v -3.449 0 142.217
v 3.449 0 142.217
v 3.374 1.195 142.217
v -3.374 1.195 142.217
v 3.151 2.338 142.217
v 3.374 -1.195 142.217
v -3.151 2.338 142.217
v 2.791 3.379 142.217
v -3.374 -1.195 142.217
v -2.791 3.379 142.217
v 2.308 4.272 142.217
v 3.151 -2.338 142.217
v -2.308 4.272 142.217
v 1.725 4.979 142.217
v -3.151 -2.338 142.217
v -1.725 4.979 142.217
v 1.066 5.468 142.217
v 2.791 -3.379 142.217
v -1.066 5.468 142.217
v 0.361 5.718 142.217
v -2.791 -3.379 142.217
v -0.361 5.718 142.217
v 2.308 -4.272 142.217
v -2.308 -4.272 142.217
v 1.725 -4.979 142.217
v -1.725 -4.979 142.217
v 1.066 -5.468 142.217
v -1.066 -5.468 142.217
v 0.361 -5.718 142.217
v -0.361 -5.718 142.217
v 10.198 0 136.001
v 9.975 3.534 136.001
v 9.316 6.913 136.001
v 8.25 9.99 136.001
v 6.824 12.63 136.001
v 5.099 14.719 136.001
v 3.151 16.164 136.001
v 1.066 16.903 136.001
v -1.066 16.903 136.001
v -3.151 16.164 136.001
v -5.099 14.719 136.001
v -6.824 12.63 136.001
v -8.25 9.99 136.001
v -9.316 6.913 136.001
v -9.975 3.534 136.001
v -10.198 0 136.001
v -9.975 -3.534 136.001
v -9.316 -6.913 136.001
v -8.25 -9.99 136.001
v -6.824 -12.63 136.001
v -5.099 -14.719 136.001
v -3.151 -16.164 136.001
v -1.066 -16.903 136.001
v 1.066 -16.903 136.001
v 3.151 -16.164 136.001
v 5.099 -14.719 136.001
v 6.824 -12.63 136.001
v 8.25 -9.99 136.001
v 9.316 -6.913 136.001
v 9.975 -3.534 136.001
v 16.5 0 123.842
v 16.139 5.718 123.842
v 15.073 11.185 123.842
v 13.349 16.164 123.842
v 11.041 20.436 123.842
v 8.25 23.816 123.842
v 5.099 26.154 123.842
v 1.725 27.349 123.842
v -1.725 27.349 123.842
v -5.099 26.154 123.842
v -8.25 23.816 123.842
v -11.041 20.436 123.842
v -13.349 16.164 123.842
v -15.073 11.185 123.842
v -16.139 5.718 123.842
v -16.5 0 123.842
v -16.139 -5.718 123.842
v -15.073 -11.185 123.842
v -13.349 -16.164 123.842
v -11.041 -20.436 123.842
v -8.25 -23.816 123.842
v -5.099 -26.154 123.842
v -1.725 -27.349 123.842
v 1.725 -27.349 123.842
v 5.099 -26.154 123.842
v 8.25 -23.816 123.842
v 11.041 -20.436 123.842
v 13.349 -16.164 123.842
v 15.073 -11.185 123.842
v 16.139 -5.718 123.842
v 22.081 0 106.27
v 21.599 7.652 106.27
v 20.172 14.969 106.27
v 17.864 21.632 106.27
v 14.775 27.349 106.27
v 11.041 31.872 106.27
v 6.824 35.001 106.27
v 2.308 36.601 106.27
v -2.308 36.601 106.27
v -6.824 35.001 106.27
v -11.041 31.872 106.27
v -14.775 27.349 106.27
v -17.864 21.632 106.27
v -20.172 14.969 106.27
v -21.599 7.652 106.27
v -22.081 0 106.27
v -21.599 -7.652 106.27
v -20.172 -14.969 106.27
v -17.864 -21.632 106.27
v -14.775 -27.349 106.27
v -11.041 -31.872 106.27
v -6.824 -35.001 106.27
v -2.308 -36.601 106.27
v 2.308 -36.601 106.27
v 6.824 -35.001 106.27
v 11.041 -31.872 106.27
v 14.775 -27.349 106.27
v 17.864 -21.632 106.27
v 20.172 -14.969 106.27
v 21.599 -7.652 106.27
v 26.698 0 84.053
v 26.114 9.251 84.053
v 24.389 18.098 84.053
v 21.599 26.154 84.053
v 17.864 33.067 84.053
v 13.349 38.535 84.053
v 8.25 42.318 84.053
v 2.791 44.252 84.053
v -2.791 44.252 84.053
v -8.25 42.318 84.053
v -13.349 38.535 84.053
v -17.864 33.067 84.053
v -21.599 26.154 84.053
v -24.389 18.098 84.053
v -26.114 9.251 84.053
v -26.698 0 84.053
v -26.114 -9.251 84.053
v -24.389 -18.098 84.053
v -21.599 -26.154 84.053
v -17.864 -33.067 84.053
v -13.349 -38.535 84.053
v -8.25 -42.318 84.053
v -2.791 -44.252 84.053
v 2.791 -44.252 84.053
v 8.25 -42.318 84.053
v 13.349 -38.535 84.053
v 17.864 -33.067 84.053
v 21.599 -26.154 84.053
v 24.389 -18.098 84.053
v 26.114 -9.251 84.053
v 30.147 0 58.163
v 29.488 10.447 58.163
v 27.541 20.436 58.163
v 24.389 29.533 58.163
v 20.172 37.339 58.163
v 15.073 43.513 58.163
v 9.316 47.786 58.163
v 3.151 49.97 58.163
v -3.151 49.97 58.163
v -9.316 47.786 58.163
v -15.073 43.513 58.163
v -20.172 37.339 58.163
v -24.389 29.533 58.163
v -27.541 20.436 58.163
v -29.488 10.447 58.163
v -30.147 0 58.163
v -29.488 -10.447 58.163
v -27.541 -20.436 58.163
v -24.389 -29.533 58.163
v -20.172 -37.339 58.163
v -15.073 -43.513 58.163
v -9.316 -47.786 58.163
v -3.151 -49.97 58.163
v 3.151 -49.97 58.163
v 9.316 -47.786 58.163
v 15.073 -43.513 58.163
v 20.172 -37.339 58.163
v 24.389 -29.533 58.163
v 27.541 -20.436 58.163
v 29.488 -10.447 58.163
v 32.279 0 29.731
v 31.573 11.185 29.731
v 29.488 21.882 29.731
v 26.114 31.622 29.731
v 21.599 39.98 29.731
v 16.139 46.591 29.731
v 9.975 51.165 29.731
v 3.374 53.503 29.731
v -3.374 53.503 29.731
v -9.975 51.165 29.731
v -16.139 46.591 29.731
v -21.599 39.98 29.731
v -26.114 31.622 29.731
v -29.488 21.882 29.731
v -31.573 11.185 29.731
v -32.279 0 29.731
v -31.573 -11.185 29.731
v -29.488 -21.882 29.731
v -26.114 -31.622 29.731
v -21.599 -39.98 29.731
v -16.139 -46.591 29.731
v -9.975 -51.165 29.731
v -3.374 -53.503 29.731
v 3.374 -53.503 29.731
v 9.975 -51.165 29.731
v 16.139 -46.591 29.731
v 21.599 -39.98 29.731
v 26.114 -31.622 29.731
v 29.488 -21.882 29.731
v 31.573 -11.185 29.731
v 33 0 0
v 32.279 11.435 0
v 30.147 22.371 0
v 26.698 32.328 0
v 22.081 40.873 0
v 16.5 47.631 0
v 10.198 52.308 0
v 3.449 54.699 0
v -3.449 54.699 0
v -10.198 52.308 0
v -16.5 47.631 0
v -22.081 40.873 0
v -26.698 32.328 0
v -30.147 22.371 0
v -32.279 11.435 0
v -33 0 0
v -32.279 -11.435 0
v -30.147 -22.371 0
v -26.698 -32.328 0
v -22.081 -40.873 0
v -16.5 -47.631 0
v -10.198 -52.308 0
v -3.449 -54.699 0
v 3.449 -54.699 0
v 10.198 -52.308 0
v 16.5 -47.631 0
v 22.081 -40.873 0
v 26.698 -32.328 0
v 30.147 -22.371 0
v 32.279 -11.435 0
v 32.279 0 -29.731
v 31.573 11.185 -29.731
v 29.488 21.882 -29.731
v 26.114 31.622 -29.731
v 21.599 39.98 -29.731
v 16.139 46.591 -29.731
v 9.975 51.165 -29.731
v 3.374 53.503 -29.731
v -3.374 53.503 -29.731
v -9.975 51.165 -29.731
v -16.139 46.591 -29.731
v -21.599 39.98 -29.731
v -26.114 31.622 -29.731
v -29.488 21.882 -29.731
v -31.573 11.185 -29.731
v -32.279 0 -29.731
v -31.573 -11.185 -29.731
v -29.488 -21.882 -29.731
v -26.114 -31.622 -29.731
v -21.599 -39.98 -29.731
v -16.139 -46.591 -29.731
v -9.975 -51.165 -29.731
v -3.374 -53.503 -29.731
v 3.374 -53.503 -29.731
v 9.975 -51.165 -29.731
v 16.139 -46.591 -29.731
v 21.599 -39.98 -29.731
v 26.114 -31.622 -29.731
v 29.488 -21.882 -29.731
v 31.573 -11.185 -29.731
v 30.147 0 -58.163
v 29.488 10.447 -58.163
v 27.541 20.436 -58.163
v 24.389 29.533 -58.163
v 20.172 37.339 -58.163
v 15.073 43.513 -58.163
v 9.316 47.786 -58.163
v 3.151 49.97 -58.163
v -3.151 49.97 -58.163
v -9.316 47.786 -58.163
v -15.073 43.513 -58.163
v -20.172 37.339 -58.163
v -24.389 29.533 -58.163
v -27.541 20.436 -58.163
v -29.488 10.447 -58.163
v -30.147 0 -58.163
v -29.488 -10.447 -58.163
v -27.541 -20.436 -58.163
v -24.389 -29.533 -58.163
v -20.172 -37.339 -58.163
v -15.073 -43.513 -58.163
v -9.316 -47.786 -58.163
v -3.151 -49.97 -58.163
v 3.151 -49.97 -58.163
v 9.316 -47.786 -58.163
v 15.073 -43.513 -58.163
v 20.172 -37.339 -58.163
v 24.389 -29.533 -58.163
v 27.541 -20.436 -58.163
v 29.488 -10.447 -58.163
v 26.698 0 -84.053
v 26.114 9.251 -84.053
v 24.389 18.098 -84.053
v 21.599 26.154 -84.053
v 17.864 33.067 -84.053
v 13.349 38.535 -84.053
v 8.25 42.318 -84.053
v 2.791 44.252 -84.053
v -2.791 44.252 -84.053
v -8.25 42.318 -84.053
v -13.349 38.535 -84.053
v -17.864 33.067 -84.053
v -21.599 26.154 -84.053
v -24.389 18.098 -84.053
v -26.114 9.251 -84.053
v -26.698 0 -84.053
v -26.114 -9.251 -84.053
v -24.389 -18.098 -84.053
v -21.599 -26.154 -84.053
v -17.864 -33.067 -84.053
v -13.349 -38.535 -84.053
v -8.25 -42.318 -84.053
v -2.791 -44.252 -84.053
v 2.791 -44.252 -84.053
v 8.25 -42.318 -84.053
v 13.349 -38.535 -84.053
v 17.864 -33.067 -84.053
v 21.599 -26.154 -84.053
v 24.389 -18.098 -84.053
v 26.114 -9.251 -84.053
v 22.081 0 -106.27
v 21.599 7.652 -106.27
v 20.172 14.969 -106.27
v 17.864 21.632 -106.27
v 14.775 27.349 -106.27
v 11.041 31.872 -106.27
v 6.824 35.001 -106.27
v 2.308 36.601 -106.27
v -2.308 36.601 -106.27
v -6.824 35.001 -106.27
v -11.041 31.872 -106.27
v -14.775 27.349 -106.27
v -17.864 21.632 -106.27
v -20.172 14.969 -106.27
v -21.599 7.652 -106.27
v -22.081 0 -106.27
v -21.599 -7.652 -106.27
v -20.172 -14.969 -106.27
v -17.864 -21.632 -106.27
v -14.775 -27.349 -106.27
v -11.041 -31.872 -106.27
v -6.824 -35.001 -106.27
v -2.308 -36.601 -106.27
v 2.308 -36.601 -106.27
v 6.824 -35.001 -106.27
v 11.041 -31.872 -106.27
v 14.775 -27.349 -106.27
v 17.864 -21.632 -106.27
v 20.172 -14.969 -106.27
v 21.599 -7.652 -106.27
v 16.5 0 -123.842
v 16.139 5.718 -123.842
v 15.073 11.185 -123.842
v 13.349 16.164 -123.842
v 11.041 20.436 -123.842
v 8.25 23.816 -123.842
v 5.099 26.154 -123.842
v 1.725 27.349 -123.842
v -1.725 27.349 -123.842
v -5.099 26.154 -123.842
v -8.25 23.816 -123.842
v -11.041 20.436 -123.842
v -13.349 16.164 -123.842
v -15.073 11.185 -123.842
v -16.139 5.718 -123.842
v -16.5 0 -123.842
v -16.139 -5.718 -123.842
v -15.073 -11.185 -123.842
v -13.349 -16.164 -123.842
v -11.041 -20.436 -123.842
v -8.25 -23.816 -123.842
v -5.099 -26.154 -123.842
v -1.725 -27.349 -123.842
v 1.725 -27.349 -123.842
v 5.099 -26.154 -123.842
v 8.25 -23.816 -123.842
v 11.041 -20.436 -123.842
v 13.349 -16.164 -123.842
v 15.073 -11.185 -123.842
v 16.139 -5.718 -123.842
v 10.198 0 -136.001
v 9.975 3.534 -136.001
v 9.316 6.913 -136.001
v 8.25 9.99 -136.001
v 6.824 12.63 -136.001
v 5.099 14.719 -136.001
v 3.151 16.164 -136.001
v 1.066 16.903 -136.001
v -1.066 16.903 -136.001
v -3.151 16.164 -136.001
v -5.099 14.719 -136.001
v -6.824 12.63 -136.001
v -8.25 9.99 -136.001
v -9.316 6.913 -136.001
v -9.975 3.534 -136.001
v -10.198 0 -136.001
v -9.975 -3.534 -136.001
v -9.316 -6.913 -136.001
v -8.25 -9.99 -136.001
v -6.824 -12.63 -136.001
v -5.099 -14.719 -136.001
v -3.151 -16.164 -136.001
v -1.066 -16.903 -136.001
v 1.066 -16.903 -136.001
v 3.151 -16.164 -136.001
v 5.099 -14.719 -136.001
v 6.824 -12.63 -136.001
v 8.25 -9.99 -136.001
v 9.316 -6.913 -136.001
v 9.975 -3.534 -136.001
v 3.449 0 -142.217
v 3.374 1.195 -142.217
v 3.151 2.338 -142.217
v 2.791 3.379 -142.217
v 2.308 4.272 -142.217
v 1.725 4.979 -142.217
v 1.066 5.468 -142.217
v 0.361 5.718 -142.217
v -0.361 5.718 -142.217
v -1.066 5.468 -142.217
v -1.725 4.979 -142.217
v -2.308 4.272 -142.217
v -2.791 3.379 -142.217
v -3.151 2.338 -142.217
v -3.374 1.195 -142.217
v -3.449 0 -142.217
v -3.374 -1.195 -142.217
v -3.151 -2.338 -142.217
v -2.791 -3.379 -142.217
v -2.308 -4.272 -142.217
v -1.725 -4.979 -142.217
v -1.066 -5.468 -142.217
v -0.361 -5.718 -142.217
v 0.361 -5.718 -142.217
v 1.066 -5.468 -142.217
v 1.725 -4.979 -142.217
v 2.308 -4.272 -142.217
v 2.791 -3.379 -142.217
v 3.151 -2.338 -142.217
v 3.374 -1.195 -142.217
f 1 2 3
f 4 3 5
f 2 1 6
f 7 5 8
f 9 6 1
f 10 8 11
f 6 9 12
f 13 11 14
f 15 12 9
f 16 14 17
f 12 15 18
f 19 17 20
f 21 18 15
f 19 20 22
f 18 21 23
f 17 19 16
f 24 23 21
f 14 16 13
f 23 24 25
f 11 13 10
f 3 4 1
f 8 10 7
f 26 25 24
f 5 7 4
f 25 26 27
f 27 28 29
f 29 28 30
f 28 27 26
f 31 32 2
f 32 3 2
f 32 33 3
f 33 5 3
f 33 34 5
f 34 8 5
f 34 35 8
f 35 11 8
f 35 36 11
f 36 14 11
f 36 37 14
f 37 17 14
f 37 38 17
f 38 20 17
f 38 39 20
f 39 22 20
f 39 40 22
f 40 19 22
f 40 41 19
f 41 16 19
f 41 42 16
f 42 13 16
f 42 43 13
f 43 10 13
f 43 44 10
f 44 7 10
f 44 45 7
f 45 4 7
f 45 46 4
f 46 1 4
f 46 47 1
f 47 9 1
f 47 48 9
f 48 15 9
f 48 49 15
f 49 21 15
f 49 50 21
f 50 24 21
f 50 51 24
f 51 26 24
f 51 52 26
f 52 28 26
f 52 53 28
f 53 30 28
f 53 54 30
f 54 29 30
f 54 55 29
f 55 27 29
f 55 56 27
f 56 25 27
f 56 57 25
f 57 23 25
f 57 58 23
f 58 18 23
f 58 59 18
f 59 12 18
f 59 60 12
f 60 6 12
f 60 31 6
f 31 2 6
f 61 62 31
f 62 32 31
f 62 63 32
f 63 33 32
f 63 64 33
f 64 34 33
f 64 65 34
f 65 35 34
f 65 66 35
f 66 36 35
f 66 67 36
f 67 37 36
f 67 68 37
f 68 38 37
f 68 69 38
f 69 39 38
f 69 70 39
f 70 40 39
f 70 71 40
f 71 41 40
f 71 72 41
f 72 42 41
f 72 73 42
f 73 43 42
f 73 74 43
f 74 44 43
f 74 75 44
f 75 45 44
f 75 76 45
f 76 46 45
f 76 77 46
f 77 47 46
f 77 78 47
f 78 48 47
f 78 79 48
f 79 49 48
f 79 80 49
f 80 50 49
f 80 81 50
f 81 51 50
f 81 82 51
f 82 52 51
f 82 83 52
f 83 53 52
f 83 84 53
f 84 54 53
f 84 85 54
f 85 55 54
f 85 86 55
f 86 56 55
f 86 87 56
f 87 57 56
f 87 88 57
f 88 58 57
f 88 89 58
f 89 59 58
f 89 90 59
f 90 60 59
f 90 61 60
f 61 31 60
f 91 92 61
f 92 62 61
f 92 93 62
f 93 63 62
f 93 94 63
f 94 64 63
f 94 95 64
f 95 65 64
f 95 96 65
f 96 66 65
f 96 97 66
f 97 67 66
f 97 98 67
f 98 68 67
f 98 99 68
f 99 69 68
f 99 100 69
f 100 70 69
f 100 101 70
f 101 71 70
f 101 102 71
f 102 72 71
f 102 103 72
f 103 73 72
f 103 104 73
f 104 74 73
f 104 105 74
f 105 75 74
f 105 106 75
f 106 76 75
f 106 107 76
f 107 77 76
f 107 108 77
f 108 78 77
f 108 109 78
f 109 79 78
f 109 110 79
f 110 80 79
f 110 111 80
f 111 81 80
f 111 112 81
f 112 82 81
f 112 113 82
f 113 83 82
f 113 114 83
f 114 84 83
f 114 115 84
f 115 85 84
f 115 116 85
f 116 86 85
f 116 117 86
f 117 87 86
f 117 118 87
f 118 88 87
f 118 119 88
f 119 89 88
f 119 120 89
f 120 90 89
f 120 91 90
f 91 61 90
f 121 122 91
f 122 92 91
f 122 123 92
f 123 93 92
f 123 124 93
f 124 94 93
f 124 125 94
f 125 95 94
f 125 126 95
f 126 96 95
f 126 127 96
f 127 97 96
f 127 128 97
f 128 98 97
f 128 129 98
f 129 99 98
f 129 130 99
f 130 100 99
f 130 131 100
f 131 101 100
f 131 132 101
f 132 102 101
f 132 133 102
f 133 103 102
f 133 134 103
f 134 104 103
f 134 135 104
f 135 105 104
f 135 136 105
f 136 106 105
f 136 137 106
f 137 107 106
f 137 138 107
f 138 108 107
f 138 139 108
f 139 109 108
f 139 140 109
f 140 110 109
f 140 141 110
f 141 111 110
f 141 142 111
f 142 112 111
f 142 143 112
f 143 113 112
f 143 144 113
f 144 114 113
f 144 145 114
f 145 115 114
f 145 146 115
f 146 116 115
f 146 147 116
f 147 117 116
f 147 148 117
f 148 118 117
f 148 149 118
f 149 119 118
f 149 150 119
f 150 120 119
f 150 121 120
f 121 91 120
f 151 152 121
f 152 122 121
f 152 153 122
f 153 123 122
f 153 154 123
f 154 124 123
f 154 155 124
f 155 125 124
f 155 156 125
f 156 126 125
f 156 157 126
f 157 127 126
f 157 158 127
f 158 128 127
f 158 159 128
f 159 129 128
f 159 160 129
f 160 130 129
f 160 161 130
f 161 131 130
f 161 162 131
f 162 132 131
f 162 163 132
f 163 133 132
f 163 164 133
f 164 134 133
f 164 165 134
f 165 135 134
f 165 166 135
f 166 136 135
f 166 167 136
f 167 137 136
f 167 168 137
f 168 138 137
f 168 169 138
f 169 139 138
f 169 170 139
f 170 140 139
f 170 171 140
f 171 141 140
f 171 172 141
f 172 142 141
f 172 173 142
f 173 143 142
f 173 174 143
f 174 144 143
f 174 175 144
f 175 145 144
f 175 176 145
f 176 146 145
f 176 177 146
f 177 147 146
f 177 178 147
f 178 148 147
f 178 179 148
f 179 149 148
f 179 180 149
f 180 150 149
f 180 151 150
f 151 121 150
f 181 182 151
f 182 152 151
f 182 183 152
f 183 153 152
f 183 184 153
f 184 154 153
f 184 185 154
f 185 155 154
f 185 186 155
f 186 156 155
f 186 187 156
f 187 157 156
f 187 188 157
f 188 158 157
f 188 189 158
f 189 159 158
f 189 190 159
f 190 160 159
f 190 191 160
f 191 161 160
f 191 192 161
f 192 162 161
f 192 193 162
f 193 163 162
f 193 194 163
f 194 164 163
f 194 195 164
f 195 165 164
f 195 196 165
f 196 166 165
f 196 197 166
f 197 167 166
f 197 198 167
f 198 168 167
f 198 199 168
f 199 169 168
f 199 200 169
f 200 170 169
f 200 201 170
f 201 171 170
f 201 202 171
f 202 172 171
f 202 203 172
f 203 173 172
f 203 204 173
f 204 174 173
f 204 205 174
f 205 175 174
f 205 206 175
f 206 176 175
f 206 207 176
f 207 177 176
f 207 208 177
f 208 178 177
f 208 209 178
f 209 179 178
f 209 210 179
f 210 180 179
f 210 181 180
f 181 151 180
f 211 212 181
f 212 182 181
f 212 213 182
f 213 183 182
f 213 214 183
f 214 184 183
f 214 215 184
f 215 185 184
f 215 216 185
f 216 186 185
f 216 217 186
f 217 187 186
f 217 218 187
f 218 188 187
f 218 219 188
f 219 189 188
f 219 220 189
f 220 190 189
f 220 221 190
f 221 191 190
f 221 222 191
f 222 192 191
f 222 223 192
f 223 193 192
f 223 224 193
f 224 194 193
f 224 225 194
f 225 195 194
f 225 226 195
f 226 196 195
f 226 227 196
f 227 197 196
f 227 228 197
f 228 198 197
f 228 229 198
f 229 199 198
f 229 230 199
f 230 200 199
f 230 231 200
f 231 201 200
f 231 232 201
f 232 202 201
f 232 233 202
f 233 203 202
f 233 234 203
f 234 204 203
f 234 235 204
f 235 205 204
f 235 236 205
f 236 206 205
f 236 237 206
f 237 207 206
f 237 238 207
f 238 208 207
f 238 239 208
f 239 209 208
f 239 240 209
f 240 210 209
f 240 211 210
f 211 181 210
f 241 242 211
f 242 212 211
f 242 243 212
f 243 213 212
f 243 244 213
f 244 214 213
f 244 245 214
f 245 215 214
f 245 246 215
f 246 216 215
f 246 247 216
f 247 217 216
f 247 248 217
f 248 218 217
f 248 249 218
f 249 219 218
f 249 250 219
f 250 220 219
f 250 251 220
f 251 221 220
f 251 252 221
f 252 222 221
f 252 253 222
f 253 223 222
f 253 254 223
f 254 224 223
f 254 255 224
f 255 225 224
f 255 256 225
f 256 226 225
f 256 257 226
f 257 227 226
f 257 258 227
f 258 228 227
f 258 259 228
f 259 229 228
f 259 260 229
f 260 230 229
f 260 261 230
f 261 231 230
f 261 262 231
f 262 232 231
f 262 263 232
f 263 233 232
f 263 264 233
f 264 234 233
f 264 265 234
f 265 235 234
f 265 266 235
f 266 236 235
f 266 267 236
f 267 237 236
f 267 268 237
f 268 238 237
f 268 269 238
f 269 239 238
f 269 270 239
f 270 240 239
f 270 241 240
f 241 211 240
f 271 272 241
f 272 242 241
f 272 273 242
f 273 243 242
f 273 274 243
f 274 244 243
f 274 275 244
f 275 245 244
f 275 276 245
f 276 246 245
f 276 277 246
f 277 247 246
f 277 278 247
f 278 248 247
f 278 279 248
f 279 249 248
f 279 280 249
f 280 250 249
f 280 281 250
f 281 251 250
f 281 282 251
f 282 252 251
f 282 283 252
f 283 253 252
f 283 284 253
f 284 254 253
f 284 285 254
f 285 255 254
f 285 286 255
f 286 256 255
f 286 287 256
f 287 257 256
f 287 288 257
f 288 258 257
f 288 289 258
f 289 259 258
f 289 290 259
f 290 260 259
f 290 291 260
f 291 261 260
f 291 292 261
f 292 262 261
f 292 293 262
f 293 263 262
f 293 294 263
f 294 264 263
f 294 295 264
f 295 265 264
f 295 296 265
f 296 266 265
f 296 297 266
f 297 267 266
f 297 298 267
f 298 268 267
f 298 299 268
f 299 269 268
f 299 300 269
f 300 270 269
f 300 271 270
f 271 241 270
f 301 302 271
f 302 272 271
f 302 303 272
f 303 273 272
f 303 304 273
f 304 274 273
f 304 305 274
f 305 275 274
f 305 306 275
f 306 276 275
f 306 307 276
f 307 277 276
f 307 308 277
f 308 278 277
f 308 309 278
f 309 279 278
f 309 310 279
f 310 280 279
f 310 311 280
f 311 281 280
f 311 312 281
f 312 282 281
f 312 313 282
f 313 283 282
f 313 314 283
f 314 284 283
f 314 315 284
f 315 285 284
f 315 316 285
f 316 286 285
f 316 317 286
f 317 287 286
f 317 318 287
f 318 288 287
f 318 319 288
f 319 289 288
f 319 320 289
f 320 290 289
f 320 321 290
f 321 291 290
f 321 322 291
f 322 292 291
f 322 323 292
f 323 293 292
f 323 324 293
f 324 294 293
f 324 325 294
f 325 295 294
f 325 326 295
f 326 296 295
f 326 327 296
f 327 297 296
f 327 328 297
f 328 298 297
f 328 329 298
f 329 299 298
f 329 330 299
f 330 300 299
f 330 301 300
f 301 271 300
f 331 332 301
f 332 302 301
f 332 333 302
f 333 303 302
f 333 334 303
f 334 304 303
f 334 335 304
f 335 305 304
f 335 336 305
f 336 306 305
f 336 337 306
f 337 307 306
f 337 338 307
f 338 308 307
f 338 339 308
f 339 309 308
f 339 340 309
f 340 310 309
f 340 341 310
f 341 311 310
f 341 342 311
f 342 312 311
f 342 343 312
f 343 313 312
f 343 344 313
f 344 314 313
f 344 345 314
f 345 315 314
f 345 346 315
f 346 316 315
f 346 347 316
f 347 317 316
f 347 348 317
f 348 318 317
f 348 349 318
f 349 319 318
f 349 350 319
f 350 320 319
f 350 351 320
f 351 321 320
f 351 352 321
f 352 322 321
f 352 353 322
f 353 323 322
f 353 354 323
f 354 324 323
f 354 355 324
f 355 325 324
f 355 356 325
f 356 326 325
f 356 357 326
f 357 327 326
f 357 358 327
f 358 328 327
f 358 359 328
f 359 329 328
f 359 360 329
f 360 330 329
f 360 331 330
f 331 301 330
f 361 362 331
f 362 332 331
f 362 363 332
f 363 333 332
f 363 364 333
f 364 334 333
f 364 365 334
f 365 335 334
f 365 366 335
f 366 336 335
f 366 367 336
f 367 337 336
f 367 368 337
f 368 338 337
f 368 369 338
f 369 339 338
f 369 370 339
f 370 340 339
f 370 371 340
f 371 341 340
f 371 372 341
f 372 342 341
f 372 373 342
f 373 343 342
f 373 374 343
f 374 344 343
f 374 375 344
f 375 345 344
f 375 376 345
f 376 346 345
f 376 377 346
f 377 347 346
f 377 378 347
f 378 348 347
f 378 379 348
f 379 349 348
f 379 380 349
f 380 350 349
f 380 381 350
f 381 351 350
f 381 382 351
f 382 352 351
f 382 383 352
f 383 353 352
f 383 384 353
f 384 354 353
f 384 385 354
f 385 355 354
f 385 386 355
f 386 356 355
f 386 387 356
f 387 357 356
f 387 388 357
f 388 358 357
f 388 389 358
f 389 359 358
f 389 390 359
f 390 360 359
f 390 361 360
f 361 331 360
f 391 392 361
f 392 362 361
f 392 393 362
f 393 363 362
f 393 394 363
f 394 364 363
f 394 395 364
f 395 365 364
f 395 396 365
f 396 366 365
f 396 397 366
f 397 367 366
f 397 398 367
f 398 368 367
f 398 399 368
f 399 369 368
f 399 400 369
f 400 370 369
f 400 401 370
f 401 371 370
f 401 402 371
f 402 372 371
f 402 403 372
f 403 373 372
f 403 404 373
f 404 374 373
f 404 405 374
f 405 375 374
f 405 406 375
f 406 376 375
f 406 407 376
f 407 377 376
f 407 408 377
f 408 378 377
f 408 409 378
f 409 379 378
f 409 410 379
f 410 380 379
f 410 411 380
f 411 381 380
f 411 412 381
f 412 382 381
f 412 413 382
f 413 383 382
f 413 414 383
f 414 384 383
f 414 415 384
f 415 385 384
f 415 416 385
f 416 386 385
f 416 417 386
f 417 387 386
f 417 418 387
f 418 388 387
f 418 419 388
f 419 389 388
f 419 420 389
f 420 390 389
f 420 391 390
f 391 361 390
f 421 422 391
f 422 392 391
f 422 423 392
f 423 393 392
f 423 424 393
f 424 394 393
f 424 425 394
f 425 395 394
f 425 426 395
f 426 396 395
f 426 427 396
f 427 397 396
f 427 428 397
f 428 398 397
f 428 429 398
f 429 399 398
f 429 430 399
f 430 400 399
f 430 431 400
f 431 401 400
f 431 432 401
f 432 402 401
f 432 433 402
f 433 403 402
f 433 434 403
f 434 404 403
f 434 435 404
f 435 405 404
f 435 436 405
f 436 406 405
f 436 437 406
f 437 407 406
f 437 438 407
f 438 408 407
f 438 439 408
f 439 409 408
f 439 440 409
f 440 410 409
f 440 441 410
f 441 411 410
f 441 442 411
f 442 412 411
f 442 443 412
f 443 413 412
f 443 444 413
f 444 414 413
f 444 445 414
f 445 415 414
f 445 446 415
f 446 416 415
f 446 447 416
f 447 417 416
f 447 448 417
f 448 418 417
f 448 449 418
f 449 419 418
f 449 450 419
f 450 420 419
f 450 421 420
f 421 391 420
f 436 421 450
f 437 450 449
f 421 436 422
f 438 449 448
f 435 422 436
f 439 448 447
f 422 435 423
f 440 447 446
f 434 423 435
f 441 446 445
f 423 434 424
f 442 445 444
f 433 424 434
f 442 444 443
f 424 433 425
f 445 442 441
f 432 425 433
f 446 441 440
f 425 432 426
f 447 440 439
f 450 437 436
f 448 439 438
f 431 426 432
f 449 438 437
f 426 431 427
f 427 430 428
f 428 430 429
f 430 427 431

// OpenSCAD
// Generated by SolidPython 1.0.1 on 2020-07-29 00:46:45


scale(v = [3, 5, 13]) {
	sphere(r = 11);
}
/***********************************************
*********      SolidPython code:      **********
************************************************
 
# import packages: SolidPython
from solid import *
from solid.utils import *
from itertools import chain, combinations, permutations


class Resize:

    def __init__(self, scad_file):
        self.scad_file = scad_file
        #self.scad_file = import_scad(scad_file)
        # cone/cylinder param:
        self.r1 = 0
        self.r2 = 0
        self.h = 0
        # rectangular prism param:
        self.w = 0
        self.l = 0
        # ellipse param:
        self.r = 0

    # import OpenScad code (file name corresponds to shape)


    # classify shape + parameters
    def assign(self, param1, param2, param3):
        if self.scad_file == 'cone.scad':
            self.r1 = param1
            self.r2 = param2
            self.h = param3
        elif self.scad_file == 'cylinder.scad':
            self.r1 = param1
            self.r2 = param2
            self.h = param3
        elif self.scad_file == 'rectangularPrism.scad':
            self.h = param1
            self.l = param2
            self.w = param3
        else:
            self.r = param1
            self.h = param2

    # resize parameters
    def iterate(self):
        x = range(3, 20, 2)
        i = 1
        if self.scad_file == 'cone.scad':
            tempList = list(permutations(x, 2))
            for temp in tempList:
                param1 = temp[0]
                param2 = temp[1]
                filepath = 'produced_scad_files/' + 'cone' + str(param1) + '_' + str(param2) + '_' + '.scad'
                scad_render_to_file(cylinder(h=param1, r1=param2, r2=0), filepath)

        elif self.scad_file == 'cylinder.scad':
            tempList = list(permutations(x, 3))
            for temp in tempList:
                param1 = temp[0]
                param2 = temp[1]
                filepath = 'produced_scad_files/' + 'cylinder' + str(param1) + '_' + str(param2) + '_' + '.scad'
                scad_render_to_file(cylinder(h=param1, r1=param2, r2=param2), filepath)

        elif self.scad_file == 'rectangularPrism.scad':
            tempList = list(permutations(x, 3))
            for temp in tempList:
                param1 = temp[0]
                param2 = temp[1]
                param3 = temp[2]
                filepath = 'produced_scad_files/' + 'rectangularPrism' + str(param1) + '_' + str(param2) + '_' + str(
                    param3) + '.scad'
                scad_render_to_file(cube(size=(param1, param2, param3)), filepath)

        elif self.scad_file == 'ellipse.scad':
            tempList = list(permutations(x, 4))
            for temp in tempList:
                param1 = temp[0]
                param2 = temp[1]
                param3 = temp[2]
                param4 = temp[3]
                filepath = 'produced_scad_files/' + 'ellipse' + str(param1) + '_' + str(param2) + '_' + str(param3) + '_' + str(param4) + '.scad'
                scad_render_to_file(scale([param1, param2, param3])(sphere(r=param4)), filepath)

    def render_to_scadfile(self):
        scad_render_to_file(scad, 'example.scad') 
 
************************************************/
